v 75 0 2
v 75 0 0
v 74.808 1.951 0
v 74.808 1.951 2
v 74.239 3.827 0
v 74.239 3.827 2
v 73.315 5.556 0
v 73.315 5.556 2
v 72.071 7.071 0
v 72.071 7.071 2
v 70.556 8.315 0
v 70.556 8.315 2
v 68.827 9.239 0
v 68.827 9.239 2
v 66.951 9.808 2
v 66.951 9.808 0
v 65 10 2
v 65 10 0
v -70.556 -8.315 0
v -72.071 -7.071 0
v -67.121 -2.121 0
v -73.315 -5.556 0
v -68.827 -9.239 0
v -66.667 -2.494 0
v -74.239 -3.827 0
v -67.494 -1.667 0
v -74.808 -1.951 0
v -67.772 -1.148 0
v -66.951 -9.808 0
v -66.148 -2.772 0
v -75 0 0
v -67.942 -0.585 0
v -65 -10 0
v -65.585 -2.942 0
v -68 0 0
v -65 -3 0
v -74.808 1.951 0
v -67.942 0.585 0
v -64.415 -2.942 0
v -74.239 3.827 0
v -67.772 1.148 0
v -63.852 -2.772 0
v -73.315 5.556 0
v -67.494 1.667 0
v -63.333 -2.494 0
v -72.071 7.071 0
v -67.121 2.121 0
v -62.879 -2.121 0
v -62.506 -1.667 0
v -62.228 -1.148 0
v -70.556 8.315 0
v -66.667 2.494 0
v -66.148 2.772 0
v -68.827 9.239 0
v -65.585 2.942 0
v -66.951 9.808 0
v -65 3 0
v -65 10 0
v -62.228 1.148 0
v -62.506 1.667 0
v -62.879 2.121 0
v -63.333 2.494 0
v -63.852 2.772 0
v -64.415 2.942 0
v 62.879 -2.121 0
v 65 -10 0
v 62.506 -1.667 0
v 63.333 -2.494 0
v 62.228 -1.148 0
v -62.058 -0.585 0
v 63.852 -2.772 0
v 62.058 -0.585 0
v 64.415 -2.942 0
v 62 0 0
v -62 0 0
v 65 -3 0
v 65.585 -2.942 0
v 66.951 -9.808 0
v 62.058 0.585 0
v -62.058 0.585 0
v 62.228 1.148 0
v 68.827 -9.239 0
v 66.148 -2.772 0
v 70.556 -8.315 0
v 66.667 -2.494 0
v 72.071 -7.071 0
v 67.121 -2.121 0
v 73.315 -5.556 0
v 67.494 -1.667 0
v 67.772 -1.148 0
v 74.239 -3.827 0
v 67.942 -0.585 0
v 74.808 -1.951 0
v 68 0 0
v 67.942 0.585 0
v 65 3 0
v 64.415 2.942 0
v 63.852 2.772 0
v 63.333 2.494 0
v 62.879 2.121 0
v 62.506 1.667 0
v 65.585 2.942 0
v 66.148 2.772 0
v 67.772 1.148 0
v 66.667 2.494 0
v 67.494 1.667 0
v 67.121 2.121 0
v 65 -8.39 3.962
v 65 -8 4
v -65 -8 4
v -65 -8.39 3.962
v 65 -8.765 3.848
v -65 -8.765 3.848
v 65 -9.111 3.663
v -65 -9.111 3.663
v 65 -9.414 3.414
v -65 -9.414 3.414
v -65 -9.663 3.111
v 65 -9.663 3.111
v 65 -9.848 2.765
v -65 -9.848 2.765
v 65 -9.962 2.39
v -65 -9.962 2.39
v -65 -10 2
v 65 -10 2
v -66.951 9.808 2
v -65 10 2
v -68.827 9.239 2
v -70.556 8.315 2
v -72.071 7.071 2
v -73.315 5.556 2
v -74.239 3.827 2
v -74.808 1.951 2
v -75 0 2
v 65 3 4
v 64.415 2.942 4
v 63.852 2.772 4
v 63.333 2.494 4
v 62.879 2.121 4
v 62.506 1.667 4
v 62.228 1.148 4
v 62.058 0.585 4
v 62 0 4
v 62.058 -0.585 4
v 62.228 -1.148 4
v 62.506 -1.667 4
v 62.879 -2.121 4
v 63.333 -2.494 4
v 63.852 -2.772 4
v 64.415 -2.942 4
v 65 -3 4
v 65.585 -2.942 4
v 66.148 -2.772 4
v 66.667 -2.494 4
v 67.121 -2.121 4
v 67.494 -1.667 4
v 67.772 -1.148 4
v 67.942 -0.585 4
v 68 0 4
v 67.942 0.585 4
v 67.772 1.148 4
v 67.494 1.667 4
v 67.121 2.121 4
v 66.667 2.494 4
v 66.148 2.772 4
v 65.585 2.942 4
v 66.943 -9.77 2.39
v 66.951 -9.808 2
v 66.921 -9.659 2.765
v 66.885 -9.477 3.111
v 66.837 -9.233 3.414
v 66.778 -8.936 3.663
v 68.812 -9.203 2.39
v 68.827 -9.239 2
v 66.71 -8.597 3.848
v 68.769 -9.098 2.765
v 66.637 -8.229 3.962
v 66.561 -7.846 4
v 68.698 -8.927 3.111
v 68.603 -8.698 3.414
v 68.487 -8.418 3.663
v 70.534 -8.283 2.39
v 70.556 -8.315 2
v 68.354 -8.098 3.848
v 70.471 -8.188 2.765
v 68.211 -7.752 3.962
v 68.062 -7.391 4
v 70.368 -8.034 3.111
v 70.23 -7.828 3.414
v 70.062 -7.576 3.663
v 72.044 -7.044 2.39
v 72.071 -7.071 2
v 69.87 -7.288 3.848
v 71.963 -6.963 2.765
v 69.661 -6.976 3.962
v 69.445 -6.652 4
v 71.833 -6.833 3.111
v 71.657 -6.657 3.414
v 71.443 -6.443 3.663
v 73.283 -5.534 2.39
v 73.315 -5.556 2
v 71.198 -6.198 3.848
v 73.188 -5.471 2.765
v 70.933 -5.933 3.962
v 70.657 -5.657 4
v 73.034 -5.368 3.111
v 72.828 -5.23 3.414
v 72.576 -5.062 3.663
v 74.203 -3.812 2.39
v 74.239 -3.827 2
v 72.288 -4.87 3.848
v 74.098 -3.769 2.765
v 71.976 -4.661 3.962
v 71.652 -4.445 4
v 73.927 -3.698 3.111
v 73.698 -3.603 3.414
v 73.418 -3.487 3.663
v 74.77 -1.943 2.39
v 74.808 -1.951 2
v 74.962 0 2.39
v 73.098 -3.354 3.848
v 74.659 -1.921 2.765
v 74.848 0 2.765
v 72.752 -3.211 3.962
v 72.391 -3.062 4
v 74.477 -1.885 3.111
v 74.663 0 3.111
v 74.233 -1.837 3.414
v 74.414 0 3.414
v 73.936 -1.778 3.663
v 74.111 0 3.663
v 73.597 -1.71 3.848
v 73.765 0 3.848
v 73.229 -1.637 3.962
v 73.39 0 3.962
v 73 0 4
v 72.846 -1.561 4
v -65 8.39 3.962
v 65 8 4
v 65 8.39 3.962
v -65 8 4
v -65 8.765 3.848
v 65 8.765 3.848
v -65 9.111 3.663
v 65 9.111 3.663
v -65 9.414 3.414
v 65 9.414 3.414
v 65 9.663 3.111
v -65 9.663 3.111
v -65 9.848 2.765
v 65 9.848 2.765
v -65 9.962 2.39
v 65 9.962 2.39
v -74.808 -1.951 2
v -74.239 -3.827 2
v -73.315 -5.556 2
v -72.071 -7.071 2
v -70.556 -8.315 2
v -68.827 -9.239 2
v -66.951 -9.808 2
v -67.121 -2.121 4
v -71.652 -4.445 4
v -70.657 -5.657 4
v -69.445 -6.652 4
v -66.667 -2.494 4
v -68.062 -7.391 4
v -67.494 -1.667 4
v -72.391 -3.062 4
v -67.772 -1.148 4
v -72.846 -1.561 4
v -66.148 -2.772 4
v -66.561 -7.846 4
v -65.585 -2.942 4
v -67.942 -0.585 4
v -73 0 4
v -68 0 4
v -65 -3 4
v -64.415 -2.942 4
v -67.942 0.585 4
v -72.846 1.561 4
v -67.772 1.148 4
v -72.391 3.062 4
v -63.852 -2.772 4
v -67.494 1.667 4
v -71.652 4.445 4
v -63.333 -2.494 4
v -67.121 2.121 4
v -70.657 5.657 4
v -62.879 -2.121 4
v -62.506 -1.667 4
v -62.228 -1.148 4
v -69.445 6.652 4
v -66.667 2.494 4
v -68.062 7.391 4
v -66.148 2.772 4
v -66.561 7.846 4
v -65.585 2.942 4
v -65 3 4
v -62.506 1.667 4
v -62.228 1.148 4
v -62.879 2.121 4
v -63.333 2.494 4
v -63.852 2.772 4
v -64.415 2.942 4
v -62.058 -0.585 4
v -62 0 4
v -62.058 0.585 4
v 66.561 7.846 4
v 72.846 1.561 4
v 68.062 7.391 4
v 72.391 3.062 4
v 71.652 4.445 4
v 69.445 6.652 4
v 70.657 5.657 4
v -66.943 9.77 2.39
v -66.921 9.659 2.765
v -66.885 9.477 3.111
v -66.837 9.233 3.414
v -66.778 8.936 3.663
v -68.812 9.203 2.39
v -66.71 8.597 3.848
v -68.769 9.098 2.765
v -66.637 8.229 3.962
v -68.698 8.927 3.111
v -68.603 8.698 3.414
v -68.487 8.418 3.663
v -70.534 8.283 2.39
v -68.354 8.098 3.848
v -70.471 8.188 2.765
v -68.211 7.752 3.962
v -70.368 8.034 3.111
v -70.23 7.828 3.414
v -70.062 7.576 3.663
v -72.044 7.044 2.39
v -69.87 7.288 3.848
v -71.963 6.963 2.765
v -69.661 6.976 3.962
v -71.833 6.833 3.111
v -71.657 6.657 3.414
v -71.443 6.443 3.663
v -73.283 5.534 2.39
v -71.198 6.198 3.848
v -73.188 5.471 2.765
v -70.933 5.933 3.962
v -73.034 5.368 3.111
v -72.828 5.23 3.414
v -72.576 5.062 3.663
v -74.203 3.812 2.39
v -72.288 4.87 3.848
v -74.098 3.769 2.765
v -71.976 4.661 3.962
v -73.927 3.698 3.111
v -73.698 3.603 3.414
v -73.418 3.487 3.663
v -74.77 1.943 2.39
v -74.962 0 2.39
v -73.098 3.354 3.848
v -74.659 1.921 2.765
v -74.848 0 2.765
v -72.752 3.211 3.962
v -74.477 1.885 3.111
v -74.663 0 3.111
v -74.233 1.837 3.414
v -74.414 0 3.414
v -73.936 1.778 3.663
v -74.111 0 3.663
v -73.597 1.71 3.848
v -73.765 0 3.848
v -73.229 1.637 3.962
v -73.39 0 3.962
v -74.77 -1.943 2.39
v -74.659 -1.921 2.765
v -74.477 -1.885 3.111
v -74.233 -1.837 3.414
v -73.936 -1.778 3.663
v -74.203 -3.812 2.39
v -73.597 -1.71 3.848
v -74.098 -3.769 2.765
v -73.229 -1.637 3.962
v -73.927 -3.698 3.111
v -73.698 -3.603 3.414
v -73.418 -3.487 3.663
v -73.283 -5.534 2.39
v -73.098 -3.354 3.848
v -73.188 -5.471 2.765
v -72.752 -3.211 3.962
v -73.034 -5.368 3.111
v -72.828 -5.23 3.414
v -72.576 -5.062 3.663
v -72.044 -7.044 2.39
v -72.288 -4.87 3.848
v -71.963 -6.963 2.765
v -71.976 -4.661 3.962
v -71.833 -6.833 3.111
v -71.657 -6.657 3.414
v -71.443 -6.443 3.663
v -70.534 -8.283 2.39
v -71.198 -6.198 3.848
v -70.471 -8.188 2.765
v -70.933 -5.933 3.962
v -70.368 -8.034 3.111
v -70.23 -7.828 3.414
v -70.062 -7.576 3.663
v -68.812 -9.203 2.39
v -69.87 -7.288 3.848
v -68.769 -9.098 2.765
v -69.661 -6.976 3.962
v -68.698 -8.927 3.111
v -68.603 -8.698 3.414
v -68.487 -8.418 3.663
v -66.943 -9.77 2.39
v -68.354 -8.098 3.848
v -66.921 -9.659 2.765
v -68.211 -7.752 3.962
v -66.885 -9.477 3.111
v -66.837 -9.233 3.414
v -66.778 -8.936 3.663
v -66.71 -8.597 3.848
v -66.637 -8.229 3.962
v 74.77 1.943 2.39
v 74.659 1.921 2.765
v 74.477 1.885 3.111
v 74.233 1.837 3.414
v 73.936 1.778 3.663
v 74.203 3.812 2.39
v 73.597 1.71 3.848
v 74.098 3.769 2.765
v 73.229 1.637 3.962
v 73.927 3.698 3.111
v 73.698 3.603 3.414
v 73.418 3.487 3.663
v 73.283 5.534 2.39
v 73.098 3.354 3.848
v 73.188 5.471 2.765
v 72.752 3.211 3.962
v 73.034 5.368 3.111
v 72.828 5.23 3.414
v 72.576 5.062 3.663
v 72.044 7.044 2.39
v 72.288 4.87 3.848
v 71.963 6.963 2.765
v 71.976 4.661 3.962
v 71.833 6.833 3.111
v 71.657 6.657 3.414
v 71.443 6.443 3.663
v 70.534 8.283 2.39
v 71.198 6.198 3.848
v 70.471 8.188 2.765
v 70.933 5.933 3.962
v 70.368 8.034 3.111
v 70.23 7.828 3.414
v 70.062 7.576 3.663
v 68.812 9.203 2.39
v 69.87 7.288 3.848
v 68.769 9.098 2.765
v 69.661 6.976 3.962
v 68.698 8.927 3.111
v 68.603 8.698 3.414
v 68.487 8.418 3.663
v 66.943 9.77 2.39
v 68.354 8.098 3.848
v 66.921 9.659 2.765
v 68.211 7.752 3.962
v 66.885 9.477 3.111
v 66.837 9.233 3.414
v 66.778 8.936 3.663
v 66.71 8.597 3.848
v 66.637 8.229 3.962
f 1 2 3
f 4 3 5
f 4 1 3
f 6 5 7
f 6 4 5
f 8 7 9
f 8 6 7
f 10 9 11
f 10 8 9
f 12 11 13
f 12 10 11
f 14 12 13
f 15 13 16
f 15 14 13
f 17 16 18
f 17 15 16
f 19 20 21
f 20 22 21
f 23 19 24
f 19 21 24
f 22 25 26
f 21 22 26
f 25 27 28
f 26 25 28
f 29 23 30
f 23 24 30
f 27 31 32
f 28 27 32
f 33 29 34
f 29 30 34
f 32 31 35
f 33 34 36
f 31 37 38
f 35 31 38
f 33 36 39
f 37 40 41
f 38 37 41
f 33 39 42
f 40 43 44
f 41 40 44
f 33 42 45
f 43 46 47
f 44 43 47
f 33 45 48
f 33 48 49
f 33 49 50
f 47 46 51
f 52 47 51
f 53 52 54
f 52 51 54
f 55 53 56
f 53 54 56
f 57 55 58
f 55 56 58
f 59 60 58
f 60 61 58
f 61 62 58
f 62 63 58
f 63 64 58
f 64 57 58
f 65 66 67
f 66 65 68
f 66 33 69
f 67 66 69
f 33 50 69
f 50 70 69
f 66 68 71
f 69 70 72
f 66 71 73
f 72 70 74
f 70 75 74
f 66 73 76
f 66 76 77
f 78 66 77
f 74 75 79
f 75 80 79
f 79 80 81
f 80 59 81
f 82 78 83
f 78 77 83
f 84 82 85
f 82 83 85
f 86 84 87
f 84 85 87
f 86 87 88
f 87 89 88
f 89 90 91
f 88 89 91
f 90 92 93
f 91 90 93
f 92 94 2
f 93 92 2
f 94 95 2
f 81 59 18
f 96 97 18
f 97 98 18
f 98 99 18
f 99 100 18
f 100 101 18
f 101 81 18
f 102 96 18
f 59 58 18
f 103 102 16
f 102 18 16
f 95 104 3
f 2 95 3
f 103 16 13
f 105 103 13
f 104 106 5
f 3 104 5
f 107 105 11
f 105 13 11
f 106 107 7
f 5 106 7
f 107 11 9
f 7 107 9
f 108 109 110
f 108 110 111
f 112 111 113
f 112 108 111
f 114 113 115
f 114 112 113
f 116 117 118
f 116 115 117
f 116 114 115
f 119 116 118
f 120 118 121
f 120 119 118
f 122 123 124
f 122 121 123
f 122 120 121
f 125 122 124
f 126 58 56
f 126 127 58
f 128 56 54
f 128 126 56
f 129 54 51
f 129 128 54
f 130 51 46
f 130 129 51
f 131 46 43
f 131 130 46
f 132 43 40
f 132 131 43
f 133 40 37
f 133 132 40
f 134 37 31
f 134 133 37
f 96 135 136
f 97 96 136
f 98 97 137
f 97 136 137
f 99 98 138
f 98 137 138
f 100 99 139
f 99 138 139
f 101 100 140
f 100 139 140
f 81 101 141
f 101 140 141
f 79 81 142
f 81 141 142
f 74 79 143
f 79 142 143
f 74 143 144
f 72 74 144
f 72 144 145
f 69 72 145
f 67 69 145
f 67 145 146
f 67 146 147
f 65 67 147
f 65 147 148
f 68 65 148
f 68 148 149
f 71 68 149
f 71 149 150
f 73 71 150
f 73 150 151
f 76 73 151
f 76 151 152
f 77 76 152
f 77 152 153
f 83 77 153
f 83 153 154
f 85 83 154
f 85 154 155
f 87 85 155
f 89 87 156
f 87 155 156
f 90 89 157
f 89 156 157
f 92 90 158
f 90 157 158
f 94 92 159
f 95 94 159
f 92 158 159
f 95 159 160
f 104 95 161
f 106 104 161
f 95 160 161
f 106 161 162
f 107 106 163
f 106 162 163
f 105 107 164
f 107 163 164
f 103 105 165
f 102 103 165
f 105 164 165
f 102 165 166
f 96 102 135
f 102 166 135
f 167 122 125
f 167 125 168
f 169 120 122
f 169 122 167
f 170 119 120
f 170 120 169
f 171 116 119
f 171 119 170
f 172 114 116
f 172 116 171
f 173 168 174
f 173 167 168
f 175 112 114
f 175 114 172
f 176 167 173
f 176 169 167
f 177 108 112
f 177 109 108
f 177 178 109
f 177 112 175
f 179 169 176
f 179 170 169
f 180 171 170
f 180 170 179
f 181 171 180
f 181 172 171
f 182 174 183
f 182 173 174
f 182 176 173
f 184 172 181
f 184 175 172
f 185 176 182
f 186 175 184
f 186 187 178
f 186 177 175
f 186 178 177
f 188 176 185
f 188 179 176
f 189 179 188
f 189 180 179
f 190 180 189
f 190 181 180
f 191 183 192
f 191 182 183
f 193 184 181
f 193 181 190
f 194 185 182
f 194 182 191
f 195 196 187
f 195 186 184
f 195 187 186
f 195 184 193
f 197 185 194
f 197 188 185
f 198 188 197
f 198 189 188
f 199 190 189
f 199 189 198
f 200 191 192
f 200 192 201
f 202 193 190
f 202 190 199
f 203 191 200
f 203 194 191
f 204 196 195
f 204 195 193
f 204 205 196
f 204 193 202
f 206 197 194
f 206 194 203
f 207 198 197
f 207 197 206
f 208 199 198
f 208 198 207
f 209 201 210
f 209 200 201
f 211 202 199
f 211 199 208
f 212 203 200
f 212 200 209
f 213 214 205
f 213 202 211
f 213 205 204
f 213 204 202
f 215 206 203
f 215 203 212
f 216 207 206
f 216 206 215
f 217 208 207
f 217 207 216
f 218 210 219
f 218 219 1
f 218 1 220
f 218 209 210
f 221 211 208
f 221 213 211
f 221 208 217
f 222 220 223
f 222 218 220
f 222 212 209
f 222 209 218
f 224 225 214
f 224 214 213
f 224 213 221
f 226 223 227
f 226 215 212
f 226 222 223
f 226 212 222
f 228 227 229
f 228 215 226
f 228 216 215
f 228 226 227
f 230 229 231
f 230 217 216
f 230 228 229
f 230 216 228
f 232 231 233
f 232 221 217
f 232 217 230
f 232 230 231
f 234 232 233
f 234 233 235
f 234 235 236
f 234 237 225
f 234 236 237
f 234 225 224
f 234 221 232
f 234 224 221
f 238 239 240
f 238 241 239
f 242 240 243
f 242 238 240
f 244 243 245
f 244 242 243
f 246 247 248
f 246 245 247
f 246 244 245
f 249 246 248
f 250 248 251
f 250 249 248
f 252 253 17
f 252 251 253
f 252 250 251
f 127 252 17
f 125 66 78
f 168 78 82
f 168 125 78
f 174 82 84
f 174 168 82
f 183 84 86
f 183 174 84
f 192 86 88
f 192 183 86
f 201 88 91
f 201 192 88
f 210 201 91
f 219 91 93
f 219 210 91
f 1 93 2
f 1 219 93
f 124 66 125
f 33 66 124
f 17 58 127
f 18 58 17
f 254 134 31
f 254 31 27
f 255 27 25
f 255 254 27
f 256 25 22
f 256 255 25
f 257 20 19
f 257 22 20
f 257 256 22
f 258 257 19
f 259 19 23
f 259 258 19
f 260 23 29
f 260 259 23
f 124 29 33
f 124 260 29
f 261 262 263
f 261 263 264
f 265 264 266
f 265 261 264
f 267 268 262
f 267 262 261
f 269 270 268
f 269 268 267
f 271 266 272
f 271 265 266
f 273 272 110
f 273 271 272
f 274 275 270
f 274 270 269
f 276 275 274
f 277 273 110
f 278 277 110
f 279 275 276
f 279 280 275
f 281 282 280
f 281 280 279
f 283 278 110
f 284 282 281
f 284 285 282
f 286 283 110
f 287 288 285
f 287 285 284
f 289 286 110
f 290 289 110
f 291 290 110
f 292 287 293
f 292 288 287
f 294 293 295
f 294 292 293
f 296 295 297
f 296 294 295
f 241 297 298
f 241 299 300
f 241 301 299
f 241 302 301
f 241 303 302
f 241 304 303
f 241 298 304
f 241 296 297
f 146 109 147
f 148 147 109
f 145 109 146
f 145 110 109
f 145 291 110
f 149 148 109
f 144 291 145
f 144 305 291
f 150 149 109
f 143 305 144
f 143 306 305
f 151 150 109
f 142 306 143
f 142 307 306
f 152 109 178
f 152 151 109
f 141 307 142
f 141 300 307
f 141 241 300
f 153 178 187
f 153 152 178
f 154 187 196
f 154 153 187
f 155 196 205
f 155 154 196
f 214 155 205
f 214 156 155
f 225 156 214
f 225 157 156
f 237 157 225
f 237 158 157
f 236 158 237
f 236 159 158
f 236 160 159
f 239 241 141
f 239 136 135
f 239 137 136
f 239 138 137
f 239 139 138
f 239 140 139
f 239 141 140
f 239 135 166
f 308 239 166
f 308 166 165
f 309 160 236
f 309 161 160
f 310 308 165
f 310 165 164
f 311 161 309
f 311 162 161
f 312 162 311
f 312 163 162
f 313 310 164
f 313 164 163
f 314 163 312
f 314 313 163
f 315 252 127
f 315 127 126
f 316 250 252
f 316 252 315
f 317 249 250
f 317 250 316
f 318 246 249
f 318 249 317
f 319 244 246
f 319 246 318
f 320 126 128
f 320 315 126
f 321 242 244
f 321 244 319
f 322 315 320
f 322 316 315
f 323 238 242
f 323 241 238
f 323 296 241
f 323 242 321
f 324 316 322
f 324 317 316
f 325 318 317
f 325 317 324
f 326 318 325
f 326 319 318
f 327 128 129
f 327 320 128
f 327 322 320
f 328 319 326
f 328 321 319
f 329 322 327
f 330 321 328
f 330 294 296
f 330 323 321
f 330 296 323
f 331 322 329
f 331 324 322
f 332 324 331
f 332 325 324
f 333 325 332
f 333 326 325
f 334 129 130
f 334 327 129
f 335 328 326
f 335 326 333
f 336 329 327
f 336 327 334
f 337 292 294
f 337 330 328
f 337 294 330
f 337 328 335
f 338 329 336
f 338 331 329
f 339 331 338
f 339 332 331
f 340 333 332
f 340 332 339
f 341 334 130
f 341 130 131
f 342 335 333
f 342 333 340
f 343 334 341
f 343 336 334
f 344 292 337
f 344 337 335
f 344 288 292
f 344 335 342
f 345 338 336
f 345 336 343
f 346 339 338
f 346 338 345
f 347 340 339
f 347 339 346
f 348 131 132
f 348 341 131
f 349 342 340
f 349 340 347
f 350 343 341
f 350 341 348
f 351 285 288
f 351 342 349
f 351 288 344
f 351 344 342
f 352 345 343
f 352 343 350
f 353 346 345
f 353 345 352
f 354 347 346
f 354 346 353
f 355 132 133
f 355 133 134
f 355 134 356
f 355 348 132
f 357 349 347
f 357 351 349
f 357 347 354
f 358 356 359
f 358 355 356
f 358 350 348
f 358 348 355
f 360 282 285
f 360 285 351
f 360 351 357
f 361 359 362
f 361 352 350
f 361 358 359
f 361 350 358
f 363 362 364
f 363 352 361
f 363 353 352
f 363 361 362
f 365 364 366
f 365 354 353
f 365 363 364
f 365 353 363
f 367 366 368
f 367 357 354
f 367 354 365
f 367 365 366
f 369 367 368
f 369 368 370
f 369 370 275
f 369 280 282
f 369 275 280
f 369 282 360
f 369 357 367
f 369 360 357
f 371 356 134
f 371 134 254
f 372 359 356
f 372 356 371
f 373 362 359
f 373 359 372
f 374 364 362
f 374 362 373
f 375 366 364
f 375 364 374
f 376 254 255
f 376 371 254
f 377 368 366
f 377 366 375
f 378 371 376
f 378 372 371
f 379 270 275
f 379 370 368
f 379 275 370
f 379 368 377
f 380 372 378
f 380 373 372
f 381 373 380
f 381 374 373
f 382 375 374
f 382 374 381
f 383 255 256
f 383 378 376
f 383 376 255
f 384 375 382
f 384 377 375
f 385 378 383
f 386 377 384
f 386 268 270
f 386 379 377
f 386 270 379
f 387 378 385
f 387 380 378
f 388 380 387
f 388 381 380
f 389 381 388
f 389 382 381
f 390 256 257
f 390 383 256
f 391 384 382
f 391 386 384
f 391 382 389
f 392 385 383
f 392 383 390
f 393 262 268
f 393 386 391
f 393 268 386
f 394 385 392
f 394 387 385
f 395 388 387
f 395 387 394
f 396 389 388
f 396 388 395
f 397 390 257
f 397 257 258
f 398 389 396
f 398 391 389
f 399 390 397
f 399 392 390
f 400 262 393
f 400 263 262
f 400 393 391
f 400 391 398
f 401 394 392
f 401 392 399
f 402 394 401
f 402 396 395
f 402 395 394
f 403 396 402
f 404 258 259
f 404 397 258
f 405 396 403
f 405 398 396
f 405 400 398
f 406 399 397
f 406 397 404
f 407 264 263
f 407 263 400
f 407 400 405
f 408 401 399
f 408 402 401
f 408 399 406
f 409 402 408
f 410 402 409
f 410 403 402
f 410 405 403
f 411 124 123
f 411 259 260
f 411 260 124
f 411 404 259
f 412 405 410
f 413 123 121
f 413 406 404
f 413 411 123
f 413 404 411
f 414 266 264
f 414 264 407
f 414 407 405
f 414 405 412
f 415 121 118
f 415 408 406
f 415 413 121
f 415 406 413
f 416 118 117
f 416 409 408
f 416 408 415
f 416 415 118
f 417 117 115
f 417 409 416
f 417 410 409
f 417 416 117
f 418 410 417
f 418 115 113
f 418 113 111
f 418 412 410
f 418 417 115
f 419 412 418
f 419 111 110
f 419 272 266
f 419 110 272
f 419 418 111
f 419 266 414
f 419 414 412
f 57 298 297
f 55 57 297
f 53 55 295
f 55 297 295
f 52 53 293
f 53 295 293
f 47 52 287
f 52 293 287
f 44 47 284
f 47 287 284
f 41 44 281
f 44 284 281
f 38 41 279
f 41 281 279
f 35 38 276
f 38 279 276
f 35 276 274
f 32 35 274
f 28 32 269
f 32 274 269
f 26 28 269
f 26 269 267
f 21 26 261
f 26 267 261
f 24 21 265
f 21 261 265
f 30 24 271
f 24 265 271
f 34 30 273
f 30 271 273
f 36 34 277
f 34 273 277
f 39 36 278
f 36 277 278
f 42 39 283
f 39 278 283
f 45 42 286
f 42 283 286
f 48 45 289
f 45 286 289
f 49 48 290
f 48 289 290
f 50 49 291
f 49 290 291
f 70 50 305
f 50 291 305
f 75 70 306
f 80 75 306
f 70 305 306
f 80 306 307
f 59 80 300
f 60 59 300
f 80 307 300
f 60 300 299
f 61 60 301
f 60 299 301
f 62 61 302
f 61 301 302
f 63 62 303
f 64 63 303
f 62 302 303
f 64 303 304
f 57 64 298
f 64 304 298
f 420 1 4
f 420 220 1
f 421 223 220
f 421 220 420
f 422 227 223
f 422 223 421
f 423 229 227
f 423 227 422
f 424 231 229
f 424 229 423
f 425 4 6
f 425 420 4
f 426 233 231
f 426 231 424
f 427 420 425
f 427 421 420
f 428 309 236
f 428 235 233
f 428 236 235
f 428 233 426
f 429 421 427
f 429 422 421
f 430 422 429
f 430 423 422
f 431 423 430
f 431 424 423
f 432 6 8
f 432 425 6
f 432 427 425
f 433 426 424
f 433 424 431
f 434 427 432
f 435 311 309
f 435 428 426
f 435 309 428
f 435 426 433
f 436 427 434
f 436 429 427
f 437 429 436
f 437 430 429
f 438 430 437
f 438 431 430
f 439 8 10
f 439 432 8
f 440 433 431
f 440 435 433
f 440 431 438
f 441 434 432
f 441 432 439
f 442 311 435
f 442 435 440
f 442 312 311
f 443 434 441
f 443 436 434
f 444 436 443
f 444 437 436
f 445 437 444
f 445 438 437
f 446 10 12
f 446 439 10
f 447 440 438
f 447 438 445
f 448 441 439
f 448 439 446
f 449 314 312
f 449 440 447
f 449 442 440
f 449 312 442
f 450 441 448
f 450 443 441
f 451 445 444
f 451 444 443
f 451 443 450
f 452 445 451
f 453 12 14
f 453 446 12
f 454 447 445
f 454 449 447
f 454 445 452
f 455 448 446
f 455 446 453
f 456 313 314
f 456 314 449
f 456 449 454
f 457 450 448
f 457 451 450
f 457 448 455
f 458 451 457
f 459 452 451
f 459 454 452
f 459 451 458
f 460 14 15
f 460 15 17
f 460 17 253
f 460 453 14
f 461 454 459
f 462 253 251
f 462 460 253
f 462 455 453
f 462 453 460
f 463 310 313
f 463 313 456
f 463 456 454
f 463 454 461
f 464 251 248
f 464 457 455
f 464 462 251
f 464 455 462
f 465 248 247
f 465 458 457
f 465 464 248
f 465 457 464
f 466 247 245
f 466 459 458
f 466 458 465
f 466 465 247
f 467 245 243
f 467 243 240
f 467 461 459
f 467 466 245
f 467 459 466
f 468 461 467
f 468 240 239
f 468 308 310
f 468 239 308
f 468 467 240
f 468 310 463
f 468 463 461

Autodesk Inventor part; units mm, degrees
ref_plane "YZ Plane" through (0, 0, 0) normal (1, 0, 0) x (0, 1, 0)
ref_plane "XZ Plane" through (0, 0, 0) normal (0, 1, 0) x (-1, 0, 0)
ref_plane "XY Plane" through (0, 0, 0) normal (0, 0, 1) x (1, 0, 0)
sketch "スケッチ1" plane through (0, 0, 0) normal (0, 0, 1) x (1, 0, 0)
  line L0 (-75, 10) -> (75, 10)
  line L1 (75, 10) -> (75, -10)
  line L2 (75, -10) -> (-75, -10)
  line L3 (-75, -10) -> (-75, 10)
  line L4 (-75, 10) -> (75, -10) construction
  line L5 (75, 10) -> (-75, -10) construction
  point P0 (0, 0)
  dimension "d0" = 150
  dimension "d1" = 20
extrude "押し出し1" add sketch "スケッチ1" along normal blind 4
fillet "フィレット1" radius 10 4 edges at (75, 10, 2) (75, -10, 2) (-75, 10, 2) (-75, -10, 2)
fillet "フィレット2" radius 2 4 edges at (-72.0711, 7.0711, 4) (0, -10, 4) (72.0711, 7.0711, 4) (0, 10, 4)
sketch "スケッチ2" plane through (0, 0, 0) normal (0, 0, -1) x (-1, 0, 0)
  arc A0 (-65, 10) -> (-65, -10) centre (-65, 0) ccw projected
  arc A1 (65, -10) -> (65, 10) centre (65, 0) ccw projected
  point P0 (0, 0)
  dimension "d6" = 0
  dimension "d7" = 0
hole "穴1" at (65, 0, 0) at (-65, 0, 0) direction (0, 0, 1) diameter 6 end through all
properties part number "joy_mount_I"
